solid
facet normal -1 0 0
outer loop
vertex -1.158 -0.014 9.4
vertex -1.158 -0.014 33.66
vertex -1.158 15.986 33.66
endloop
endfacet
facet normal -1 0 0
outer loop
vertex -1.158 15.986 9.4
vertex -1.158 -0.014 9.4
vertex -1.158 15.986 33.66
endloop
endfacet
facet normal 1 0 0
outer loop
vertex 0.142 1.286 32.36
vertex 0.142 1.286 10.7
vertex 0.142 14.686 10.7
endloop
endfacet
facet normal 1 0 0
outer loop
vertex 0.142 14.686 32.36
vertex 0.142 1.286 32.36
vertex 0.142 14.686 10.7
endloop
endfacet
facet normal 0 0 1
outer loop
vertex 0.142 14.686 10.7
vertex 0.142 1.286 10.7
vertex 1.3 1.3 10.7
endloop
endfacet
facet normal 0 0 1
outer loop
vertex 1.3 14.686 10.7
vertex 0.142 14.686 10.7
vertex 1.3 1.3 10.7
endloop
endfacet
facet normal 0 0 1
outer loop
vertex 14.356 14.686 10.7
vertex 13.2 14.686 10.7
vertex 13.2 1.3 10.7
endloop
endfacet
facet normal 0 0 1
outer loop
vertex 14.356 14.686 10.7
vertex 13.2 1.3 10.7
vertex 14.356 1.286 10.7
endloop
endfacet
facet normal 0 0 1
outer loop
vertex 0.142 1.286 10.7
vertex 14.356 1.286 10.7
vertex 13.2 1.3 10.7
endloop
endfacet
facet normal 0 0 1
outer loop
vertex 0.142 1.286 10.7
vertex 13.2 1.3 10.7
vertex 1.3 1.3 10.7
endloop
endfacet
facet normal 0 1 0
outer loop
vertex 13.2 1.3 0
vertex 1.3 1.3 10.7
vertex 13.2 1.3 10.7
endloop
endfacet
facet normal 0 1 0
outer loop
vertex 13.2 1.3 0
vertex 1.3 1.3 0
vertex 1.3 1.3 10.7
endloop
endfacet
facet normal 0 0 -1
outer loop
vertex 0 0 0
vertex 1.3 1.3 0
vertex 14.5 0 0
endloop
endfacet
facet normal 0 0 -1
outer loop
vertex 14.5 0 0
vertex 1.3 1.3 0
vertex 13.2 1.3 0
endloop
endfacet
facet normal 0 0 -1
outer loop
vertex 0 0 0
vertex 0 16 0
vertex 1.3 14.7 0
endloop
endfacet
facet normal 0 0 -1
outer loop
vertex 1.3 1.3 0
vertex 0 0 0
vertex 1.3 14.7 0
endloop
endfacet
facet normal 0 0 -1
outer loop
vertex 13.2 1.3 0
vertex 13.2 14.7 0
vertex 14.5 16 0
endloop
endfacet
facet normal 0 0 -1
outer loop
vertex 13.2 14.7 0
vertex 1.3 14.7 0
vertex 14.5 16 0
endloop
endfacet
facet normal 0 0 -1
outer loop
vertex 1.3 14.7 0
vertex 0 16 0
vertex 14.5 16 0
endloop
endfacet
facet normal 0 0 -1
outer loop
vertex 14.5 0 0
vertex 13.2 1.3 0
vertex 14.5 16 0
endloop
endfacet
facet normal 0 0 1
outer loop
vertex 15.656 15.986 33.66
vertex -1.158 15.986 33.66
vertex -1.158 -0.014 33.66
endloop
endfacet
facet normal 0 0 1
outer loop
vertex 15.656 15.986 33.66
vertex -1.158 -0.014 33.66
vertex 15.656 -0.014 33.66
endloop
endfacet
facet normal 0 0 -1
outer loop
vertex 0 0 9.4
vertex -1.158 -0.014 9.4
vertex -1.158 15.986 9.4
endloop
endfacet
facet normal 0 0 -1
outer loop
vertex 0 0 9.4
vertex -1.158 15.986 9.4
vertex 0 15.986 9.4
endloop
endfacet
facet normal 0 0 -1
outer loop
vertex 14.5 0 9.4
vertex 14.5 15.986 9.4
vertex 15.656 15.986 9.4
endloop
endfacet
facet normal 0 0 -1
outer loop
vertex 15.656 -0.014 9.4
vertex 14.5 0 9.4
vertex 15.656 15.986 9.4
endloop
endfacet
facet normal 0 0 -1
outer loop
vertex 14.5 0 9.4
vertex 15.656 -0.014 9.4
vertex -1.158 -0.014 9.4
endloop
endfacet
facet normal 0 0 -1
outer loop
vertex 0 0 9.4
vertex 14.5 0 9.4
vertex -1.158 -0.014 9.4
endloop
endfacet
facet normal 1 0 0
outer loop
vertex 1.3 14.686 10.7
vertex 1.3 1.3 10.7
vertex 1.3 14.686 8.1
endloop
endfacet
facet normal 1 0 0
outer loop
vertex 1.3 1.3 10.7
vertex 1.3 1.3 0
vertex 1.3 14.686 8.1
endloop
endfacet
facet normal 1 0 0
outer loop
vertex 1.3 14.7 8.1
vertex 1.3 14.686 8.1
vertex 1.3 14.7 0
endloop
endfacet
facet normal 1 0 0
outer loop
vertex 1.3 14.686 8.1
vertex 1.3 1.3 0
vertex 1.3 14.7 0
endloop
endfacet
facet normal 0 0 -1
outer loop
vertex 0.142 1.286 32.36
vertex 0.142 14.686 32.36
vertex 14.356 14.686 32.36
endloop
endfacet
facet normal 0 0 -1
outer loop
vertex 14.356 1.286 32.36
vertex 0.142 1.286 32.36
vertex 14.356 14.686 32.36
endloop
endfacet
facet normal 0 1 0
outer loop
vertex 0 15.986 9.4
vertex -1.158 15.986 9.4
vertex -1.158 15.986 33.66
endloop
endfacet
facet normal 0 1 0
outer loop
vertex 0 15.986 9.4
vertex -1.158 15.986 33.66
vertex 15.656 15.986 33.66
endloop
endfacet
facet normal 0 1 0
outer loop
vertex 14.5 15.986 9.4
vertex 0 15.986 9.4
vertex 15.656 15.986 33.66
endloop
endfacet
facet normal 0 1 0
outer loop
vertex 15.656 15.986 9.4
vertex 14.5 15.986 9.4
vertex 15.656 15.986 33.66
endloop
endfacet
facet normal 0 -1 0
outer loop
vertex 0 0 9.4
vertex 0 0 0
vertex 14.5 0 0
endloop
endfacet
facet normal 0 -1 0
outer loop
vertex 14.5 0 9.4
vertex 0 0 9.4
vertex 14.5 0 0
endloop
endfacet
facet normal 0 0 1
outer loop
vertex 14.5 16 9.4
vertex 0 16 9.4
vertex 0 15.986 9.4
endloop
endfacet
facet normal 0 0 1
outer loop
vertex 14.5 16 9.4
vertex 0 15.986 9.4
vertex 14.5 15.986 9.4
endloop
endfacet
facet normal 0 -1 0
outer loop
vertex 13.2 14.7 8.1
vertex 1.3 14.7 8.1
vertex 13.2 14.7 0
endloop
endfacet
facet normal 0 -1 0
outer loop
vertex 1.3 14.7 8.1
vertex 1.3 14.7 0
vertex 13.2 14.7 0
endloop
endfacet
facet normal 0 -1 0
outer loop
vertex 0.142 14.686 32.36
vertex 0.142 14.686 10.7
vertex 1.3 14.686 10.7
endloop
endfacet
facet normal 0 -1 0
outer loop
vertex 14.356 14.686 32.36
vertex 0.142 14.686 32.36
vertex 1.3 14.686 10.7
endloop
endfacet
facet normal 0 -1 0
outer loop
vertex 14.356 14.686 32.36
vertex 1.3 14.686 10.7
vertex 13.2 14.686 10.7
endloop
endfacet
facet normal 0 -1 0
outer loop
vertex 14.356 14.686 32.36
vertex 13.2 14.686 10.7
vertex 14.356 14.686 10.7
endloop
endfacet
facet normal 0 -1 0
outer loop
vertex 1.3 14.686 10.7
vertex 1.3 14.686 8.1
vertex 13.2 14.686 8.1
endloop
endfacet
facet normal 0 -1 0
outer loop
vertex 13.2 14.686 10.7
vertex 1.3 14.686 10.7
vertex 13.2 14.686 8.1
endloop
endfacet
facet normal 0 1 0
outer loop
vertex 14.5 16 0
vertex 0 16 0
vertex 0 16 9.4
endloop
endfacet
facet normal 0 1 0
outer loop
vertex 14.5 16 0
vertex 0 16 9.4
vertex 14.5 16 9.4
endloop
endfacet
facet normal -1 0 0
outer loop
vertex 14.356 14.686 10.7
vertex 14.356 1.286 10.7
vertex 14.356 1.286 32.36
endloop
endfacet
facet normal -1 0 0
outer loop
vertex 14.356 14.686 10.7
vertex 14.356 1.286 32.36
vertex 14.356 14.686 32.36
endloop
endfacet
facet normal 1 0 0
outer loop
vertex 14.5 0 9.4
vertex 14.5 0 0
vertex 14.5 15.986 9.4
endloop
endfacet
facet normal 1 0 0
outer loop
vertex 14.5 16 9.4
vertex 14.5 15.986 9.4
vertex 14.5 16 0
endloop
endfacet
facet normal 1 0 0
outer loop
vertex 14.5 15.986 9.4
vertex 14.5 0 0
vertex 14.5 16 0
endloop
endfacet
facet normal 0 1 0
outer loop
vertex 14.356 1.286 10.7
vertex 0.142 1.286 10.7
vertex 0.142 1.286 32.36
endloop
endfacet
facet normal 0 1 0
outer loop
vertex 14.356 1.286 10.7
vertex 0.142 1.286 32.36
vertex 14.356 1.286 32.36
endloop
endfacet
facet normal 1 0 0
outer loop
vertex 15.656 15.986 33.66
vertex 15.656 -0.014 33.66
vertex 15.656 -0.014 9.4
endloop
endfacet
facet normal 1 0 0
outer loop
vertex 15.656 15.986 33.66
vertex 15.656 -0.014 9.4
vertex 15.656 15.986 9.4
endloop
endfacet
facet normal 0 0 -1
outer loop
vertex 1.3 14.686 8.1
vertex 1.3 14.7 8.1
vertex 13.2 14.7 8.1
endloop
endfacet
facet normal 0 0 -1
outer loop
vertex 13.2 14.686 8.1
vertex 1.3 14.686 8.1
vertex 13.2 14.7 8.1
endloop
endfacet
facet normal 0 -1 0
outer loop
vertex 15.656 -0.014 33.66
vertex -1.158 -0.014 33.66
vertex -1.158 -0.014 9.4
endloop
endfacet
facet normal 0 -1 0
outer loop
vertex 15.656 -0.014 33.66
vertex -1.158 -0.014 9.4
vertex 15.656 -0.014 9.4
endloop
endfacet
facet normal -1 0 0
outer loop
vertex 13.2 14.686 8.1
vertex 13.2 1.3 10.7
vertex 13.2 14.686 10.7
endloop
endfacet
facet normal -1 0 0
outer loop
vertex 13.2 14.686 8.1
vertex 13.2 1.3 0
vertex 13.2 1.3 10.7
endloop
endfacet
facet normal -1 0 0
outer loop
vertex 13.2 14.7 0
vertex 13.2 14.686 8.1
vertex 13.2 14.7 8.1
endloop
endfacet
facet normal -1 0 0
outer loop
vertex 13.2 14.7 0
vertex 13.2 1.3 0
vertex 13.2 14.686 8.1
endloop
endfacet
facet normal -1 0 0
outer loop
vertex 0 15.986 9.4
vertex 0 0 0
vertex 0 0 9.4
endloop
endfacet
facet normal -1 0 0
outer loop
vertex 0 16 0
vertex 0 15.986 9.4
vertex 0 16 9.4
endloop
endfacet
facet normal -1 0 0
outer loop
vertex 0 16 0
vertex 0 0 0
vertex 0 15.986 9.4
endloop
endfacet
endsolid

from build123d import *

# Parameters (mm, degrees)
SKETCH1_W           = 14.5
SKETCH1_H           = 16
BOSS_EXTRUDE1_DEPTH = 9.4
SKETCH4_W           = 16.813940165
SKETCH4_H           = 16
BOSS_EXTRUDE3_DEPTH = 24.26
SHELL1_T            = -1.3


with BuildPart() as part:
    # Sketch1 → Boss-Extrude1 (new body)
    with BuildSketch(Plane.XY):
        with Locations((7.25, 8)):
            Rectangle(SKETCH1_W, SKETCH1_H)
    extrude(amount=BOSS_EXTRUDE1_DEPTH)

    # Sketch4 → Boss-Extrude3 (add)
    with BuildSketch(Plane.XY.offset(9.4)):
        with Locations((7.249467392, 7.986309029)):
            Rectangle(SKETCH4_W, SKETCH4_H)
    extrude(amount=BOSS_EXTRUDE3_DEPTH)

    # Shell1
    shell1_openings = [part.faces().sort_by_distance(p)[0] for p in [
        (7.25, 8, 0),
    ]]
    offset(amount=SHELL1_T, openings=shell1_openings, kind=Kind.INTERSECTION)


solid = part.part
